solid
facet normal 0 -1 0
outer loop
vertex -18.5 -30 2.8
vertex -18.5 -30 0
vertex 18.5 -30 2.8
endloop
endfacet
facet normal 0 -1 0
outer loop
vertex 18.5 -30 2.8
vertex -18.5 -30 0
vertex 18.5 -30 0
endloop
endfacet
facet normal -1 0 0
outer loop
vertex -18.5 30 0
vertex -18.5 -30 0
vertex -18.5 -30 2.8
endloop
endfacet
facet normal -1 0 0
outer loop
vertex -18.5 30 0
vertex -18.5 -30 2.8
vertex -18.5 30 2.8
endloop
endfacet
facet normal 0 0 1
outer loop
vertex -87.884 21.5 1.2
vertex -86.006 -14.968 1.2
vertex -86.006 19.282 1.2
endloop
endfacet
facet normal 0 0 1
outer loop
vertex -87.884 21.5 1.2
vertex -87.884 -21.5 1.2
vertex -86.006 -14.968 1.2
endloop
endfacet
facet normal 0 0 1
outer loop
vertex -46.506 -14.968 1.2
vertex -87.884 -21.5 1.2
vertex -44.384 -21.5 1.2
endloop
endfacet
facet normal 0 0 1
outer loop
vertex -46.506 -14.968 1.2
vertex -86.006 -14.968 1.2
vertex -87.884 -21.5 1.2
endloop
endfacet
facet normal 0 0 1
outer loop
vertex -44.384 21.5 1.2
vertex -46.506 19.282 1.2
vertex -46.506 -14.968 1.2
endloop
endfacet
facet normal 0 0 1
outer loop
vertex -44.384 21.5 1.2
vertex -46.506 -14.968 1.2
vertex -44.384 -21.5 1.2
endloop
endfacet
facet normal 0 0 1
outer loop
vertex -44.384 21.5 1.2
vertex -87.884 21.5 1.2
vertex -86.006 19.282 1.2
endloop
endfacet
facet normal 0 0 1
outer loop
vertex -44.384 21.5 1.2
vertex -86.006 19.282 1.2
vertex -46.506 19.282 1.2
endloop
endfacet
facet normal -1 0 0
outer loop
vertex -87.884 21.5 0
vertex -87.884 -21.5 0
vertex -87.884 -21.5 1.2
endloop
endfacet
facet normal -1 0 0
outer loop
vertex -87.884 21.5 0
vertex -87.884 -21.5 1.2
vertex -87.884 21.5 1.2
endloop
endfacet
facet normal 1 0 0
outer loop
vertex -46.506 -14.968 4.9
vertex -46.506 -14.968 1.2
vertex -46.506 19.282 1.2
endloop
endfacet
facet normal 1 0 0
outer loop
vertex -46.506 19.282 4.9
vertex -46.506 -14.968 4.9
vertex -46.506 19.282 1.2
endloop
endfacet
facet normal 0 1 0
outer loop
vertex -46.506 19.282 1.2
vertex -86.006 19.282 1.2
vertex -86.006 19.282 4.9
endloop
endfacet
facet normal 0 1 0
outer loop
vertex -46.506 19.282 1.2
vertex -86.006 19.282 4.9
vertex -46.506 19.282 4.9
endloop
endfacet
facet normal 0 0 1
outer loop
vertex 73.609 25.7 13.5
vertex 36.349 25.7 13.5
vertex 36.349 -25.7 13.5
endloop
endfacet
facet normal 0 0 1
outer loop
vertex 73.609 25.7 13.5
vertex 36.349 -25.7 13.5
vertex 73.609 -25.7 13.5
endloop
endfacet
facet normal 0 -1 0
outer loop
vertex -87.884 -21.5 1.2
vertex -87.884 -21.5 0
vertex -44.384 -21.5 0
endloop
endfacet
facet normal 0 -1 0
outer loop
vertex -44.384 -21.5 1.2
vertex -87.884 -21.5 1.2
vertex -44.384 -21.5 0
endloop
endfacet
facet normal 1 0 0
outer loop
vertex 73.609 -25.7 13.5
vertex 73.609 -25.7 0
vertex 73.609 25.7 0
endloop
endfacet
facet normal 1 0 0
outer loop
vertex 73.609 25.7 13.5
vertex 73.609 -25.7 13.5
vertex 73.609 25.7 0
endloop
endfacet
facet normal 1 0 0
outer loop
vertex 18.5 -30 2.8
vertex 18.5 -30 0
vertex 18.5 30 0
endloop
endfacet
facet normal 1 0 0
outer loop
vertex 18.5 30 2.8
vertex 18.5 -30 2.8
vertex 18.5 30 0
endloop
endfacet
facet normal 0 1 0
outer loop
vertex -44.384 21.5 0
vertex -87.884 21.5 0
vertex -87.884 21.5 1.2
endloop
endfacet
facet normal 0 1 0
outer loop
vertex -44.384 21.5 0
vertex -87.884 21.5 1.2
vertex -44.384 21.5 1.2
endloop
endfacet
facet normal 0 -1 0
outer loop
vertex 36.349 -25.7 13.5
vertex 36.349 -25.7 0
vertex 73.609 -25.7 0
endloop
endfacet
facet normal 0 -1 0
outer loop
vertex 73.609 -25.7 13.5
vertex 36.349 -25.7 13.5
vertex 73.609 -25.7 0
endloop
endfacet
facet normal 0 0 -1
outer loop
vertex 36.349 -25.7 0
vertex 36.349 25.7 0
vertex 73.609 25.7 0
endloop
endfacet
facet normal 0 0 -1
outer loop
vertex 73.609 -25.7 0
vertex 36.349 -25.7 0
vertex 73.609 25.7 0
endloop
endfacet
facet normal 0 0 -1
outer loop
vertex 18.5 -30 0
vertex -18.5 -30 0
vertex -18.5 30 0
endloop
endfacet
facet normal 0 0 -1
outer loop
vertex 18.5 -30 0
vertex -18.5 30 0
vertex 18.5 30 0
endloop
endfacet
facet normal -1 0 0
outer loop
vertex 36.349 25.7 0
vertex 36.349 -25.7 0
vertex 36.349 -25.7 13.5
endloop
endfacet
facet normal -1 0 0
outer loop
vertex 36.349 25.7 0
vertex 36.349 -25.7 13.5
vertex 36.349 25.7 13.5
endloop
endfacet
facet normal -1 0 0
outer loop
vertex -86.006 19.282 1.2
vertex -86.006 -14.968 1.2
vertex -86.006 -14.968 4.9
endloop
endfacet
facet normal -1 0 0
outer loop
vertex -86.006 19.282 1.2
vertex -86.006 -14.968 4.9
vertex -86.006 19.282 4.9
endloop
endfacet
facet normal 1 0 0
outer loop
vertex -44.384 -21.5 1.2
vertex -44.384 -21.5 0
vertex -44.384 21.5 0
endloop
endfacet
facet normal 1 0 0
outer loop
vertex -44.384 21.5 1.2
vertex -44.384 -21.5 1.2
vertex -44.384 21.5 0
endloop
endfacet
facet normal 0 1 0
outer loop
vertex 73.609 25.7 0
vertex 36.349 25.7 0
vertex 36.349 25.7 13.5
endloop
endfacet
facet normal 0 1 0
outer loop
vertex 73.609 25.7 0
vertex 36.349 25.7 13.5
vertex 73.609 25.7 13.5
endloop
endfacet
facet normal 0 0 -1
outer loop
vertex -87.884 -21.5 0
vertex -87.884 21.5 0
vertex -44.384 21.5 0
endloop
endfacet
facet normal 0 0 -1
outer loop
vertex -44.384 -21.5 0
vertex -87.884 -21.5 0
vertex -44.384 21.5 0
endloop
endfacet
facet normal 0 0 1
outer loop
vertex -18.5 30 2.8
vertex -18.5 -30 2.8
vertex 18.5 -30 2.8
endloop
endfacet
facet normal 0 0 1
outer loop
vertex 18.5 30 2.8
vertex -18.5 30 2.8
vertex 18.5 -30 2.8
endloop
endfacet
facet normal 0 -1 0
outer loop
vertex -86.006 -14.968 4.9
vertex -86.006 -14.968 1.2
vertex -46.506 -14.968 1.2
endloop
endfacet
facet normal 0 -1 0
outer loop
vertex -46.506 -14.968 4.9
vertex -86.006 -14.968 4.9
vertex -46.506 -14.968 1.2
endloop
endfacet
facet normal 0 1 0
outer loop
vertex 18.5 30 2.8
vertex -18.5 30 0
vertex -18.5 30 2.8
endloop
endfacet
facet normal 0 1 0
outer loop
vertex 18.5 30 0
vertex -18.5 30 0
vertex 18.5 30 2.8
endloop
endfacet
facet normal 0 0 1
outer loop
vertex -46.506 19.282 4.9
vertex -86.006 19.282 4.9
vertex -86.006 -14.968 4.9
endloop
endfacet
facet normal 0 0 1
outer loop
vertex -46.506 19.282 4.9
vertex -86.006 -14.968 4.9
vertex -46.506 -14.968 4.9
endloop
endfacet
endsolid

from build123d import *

# Parameters (mm, degrees)
F0_W     = 37
F0_H     = 60
F1_DEPTH = 2.8
F2_W     = 43.5
F2_H     = 43
F3_DEPTH = 1.2
F4_W     = 37.26
F4_H     = 51.4
F5_DEPTH = 13.5
F6_W     = 39.5
F6_H     = 34.25
F7_DEPTH = 3.7


with BuildPart() as f1:
    # F0 (on Top) → F1 (new body)
    with BuildSketch(Plane.XY):
        Rectangle(F0_W, F0_H)
    extrude(amount=F1_DEPTH)


with BuildPart() as f3:
    # F2 (on Top) → F3 (new body)
    with BuildSketch(Plane.XY):
        with Locations((-66.134065, 0)):
            Rectangle(F2_W, F2_H)
    extrude(amount=F3_DEPTH)

    # F6 (on face) → F7 (join)
    with BuildSketch(Plane.XY.offset(1.2)):
        with Locations((-66.256433, 2.157366)):
            Rectangle(F6_W, F6_H)
    extrude(amount=F7_DEPTH)


with BuildPart() as f5:
    # F4 (on Top) → F5 (new body)
    with BuildSketch(Plane.XY):
        with Locations((54.978926, 0)):
            Rectangle(F4_W, F4_H)
    extrude(amount=F5_DEPTH)


solid = Compound([f1.part, f3.part, f5.part])
